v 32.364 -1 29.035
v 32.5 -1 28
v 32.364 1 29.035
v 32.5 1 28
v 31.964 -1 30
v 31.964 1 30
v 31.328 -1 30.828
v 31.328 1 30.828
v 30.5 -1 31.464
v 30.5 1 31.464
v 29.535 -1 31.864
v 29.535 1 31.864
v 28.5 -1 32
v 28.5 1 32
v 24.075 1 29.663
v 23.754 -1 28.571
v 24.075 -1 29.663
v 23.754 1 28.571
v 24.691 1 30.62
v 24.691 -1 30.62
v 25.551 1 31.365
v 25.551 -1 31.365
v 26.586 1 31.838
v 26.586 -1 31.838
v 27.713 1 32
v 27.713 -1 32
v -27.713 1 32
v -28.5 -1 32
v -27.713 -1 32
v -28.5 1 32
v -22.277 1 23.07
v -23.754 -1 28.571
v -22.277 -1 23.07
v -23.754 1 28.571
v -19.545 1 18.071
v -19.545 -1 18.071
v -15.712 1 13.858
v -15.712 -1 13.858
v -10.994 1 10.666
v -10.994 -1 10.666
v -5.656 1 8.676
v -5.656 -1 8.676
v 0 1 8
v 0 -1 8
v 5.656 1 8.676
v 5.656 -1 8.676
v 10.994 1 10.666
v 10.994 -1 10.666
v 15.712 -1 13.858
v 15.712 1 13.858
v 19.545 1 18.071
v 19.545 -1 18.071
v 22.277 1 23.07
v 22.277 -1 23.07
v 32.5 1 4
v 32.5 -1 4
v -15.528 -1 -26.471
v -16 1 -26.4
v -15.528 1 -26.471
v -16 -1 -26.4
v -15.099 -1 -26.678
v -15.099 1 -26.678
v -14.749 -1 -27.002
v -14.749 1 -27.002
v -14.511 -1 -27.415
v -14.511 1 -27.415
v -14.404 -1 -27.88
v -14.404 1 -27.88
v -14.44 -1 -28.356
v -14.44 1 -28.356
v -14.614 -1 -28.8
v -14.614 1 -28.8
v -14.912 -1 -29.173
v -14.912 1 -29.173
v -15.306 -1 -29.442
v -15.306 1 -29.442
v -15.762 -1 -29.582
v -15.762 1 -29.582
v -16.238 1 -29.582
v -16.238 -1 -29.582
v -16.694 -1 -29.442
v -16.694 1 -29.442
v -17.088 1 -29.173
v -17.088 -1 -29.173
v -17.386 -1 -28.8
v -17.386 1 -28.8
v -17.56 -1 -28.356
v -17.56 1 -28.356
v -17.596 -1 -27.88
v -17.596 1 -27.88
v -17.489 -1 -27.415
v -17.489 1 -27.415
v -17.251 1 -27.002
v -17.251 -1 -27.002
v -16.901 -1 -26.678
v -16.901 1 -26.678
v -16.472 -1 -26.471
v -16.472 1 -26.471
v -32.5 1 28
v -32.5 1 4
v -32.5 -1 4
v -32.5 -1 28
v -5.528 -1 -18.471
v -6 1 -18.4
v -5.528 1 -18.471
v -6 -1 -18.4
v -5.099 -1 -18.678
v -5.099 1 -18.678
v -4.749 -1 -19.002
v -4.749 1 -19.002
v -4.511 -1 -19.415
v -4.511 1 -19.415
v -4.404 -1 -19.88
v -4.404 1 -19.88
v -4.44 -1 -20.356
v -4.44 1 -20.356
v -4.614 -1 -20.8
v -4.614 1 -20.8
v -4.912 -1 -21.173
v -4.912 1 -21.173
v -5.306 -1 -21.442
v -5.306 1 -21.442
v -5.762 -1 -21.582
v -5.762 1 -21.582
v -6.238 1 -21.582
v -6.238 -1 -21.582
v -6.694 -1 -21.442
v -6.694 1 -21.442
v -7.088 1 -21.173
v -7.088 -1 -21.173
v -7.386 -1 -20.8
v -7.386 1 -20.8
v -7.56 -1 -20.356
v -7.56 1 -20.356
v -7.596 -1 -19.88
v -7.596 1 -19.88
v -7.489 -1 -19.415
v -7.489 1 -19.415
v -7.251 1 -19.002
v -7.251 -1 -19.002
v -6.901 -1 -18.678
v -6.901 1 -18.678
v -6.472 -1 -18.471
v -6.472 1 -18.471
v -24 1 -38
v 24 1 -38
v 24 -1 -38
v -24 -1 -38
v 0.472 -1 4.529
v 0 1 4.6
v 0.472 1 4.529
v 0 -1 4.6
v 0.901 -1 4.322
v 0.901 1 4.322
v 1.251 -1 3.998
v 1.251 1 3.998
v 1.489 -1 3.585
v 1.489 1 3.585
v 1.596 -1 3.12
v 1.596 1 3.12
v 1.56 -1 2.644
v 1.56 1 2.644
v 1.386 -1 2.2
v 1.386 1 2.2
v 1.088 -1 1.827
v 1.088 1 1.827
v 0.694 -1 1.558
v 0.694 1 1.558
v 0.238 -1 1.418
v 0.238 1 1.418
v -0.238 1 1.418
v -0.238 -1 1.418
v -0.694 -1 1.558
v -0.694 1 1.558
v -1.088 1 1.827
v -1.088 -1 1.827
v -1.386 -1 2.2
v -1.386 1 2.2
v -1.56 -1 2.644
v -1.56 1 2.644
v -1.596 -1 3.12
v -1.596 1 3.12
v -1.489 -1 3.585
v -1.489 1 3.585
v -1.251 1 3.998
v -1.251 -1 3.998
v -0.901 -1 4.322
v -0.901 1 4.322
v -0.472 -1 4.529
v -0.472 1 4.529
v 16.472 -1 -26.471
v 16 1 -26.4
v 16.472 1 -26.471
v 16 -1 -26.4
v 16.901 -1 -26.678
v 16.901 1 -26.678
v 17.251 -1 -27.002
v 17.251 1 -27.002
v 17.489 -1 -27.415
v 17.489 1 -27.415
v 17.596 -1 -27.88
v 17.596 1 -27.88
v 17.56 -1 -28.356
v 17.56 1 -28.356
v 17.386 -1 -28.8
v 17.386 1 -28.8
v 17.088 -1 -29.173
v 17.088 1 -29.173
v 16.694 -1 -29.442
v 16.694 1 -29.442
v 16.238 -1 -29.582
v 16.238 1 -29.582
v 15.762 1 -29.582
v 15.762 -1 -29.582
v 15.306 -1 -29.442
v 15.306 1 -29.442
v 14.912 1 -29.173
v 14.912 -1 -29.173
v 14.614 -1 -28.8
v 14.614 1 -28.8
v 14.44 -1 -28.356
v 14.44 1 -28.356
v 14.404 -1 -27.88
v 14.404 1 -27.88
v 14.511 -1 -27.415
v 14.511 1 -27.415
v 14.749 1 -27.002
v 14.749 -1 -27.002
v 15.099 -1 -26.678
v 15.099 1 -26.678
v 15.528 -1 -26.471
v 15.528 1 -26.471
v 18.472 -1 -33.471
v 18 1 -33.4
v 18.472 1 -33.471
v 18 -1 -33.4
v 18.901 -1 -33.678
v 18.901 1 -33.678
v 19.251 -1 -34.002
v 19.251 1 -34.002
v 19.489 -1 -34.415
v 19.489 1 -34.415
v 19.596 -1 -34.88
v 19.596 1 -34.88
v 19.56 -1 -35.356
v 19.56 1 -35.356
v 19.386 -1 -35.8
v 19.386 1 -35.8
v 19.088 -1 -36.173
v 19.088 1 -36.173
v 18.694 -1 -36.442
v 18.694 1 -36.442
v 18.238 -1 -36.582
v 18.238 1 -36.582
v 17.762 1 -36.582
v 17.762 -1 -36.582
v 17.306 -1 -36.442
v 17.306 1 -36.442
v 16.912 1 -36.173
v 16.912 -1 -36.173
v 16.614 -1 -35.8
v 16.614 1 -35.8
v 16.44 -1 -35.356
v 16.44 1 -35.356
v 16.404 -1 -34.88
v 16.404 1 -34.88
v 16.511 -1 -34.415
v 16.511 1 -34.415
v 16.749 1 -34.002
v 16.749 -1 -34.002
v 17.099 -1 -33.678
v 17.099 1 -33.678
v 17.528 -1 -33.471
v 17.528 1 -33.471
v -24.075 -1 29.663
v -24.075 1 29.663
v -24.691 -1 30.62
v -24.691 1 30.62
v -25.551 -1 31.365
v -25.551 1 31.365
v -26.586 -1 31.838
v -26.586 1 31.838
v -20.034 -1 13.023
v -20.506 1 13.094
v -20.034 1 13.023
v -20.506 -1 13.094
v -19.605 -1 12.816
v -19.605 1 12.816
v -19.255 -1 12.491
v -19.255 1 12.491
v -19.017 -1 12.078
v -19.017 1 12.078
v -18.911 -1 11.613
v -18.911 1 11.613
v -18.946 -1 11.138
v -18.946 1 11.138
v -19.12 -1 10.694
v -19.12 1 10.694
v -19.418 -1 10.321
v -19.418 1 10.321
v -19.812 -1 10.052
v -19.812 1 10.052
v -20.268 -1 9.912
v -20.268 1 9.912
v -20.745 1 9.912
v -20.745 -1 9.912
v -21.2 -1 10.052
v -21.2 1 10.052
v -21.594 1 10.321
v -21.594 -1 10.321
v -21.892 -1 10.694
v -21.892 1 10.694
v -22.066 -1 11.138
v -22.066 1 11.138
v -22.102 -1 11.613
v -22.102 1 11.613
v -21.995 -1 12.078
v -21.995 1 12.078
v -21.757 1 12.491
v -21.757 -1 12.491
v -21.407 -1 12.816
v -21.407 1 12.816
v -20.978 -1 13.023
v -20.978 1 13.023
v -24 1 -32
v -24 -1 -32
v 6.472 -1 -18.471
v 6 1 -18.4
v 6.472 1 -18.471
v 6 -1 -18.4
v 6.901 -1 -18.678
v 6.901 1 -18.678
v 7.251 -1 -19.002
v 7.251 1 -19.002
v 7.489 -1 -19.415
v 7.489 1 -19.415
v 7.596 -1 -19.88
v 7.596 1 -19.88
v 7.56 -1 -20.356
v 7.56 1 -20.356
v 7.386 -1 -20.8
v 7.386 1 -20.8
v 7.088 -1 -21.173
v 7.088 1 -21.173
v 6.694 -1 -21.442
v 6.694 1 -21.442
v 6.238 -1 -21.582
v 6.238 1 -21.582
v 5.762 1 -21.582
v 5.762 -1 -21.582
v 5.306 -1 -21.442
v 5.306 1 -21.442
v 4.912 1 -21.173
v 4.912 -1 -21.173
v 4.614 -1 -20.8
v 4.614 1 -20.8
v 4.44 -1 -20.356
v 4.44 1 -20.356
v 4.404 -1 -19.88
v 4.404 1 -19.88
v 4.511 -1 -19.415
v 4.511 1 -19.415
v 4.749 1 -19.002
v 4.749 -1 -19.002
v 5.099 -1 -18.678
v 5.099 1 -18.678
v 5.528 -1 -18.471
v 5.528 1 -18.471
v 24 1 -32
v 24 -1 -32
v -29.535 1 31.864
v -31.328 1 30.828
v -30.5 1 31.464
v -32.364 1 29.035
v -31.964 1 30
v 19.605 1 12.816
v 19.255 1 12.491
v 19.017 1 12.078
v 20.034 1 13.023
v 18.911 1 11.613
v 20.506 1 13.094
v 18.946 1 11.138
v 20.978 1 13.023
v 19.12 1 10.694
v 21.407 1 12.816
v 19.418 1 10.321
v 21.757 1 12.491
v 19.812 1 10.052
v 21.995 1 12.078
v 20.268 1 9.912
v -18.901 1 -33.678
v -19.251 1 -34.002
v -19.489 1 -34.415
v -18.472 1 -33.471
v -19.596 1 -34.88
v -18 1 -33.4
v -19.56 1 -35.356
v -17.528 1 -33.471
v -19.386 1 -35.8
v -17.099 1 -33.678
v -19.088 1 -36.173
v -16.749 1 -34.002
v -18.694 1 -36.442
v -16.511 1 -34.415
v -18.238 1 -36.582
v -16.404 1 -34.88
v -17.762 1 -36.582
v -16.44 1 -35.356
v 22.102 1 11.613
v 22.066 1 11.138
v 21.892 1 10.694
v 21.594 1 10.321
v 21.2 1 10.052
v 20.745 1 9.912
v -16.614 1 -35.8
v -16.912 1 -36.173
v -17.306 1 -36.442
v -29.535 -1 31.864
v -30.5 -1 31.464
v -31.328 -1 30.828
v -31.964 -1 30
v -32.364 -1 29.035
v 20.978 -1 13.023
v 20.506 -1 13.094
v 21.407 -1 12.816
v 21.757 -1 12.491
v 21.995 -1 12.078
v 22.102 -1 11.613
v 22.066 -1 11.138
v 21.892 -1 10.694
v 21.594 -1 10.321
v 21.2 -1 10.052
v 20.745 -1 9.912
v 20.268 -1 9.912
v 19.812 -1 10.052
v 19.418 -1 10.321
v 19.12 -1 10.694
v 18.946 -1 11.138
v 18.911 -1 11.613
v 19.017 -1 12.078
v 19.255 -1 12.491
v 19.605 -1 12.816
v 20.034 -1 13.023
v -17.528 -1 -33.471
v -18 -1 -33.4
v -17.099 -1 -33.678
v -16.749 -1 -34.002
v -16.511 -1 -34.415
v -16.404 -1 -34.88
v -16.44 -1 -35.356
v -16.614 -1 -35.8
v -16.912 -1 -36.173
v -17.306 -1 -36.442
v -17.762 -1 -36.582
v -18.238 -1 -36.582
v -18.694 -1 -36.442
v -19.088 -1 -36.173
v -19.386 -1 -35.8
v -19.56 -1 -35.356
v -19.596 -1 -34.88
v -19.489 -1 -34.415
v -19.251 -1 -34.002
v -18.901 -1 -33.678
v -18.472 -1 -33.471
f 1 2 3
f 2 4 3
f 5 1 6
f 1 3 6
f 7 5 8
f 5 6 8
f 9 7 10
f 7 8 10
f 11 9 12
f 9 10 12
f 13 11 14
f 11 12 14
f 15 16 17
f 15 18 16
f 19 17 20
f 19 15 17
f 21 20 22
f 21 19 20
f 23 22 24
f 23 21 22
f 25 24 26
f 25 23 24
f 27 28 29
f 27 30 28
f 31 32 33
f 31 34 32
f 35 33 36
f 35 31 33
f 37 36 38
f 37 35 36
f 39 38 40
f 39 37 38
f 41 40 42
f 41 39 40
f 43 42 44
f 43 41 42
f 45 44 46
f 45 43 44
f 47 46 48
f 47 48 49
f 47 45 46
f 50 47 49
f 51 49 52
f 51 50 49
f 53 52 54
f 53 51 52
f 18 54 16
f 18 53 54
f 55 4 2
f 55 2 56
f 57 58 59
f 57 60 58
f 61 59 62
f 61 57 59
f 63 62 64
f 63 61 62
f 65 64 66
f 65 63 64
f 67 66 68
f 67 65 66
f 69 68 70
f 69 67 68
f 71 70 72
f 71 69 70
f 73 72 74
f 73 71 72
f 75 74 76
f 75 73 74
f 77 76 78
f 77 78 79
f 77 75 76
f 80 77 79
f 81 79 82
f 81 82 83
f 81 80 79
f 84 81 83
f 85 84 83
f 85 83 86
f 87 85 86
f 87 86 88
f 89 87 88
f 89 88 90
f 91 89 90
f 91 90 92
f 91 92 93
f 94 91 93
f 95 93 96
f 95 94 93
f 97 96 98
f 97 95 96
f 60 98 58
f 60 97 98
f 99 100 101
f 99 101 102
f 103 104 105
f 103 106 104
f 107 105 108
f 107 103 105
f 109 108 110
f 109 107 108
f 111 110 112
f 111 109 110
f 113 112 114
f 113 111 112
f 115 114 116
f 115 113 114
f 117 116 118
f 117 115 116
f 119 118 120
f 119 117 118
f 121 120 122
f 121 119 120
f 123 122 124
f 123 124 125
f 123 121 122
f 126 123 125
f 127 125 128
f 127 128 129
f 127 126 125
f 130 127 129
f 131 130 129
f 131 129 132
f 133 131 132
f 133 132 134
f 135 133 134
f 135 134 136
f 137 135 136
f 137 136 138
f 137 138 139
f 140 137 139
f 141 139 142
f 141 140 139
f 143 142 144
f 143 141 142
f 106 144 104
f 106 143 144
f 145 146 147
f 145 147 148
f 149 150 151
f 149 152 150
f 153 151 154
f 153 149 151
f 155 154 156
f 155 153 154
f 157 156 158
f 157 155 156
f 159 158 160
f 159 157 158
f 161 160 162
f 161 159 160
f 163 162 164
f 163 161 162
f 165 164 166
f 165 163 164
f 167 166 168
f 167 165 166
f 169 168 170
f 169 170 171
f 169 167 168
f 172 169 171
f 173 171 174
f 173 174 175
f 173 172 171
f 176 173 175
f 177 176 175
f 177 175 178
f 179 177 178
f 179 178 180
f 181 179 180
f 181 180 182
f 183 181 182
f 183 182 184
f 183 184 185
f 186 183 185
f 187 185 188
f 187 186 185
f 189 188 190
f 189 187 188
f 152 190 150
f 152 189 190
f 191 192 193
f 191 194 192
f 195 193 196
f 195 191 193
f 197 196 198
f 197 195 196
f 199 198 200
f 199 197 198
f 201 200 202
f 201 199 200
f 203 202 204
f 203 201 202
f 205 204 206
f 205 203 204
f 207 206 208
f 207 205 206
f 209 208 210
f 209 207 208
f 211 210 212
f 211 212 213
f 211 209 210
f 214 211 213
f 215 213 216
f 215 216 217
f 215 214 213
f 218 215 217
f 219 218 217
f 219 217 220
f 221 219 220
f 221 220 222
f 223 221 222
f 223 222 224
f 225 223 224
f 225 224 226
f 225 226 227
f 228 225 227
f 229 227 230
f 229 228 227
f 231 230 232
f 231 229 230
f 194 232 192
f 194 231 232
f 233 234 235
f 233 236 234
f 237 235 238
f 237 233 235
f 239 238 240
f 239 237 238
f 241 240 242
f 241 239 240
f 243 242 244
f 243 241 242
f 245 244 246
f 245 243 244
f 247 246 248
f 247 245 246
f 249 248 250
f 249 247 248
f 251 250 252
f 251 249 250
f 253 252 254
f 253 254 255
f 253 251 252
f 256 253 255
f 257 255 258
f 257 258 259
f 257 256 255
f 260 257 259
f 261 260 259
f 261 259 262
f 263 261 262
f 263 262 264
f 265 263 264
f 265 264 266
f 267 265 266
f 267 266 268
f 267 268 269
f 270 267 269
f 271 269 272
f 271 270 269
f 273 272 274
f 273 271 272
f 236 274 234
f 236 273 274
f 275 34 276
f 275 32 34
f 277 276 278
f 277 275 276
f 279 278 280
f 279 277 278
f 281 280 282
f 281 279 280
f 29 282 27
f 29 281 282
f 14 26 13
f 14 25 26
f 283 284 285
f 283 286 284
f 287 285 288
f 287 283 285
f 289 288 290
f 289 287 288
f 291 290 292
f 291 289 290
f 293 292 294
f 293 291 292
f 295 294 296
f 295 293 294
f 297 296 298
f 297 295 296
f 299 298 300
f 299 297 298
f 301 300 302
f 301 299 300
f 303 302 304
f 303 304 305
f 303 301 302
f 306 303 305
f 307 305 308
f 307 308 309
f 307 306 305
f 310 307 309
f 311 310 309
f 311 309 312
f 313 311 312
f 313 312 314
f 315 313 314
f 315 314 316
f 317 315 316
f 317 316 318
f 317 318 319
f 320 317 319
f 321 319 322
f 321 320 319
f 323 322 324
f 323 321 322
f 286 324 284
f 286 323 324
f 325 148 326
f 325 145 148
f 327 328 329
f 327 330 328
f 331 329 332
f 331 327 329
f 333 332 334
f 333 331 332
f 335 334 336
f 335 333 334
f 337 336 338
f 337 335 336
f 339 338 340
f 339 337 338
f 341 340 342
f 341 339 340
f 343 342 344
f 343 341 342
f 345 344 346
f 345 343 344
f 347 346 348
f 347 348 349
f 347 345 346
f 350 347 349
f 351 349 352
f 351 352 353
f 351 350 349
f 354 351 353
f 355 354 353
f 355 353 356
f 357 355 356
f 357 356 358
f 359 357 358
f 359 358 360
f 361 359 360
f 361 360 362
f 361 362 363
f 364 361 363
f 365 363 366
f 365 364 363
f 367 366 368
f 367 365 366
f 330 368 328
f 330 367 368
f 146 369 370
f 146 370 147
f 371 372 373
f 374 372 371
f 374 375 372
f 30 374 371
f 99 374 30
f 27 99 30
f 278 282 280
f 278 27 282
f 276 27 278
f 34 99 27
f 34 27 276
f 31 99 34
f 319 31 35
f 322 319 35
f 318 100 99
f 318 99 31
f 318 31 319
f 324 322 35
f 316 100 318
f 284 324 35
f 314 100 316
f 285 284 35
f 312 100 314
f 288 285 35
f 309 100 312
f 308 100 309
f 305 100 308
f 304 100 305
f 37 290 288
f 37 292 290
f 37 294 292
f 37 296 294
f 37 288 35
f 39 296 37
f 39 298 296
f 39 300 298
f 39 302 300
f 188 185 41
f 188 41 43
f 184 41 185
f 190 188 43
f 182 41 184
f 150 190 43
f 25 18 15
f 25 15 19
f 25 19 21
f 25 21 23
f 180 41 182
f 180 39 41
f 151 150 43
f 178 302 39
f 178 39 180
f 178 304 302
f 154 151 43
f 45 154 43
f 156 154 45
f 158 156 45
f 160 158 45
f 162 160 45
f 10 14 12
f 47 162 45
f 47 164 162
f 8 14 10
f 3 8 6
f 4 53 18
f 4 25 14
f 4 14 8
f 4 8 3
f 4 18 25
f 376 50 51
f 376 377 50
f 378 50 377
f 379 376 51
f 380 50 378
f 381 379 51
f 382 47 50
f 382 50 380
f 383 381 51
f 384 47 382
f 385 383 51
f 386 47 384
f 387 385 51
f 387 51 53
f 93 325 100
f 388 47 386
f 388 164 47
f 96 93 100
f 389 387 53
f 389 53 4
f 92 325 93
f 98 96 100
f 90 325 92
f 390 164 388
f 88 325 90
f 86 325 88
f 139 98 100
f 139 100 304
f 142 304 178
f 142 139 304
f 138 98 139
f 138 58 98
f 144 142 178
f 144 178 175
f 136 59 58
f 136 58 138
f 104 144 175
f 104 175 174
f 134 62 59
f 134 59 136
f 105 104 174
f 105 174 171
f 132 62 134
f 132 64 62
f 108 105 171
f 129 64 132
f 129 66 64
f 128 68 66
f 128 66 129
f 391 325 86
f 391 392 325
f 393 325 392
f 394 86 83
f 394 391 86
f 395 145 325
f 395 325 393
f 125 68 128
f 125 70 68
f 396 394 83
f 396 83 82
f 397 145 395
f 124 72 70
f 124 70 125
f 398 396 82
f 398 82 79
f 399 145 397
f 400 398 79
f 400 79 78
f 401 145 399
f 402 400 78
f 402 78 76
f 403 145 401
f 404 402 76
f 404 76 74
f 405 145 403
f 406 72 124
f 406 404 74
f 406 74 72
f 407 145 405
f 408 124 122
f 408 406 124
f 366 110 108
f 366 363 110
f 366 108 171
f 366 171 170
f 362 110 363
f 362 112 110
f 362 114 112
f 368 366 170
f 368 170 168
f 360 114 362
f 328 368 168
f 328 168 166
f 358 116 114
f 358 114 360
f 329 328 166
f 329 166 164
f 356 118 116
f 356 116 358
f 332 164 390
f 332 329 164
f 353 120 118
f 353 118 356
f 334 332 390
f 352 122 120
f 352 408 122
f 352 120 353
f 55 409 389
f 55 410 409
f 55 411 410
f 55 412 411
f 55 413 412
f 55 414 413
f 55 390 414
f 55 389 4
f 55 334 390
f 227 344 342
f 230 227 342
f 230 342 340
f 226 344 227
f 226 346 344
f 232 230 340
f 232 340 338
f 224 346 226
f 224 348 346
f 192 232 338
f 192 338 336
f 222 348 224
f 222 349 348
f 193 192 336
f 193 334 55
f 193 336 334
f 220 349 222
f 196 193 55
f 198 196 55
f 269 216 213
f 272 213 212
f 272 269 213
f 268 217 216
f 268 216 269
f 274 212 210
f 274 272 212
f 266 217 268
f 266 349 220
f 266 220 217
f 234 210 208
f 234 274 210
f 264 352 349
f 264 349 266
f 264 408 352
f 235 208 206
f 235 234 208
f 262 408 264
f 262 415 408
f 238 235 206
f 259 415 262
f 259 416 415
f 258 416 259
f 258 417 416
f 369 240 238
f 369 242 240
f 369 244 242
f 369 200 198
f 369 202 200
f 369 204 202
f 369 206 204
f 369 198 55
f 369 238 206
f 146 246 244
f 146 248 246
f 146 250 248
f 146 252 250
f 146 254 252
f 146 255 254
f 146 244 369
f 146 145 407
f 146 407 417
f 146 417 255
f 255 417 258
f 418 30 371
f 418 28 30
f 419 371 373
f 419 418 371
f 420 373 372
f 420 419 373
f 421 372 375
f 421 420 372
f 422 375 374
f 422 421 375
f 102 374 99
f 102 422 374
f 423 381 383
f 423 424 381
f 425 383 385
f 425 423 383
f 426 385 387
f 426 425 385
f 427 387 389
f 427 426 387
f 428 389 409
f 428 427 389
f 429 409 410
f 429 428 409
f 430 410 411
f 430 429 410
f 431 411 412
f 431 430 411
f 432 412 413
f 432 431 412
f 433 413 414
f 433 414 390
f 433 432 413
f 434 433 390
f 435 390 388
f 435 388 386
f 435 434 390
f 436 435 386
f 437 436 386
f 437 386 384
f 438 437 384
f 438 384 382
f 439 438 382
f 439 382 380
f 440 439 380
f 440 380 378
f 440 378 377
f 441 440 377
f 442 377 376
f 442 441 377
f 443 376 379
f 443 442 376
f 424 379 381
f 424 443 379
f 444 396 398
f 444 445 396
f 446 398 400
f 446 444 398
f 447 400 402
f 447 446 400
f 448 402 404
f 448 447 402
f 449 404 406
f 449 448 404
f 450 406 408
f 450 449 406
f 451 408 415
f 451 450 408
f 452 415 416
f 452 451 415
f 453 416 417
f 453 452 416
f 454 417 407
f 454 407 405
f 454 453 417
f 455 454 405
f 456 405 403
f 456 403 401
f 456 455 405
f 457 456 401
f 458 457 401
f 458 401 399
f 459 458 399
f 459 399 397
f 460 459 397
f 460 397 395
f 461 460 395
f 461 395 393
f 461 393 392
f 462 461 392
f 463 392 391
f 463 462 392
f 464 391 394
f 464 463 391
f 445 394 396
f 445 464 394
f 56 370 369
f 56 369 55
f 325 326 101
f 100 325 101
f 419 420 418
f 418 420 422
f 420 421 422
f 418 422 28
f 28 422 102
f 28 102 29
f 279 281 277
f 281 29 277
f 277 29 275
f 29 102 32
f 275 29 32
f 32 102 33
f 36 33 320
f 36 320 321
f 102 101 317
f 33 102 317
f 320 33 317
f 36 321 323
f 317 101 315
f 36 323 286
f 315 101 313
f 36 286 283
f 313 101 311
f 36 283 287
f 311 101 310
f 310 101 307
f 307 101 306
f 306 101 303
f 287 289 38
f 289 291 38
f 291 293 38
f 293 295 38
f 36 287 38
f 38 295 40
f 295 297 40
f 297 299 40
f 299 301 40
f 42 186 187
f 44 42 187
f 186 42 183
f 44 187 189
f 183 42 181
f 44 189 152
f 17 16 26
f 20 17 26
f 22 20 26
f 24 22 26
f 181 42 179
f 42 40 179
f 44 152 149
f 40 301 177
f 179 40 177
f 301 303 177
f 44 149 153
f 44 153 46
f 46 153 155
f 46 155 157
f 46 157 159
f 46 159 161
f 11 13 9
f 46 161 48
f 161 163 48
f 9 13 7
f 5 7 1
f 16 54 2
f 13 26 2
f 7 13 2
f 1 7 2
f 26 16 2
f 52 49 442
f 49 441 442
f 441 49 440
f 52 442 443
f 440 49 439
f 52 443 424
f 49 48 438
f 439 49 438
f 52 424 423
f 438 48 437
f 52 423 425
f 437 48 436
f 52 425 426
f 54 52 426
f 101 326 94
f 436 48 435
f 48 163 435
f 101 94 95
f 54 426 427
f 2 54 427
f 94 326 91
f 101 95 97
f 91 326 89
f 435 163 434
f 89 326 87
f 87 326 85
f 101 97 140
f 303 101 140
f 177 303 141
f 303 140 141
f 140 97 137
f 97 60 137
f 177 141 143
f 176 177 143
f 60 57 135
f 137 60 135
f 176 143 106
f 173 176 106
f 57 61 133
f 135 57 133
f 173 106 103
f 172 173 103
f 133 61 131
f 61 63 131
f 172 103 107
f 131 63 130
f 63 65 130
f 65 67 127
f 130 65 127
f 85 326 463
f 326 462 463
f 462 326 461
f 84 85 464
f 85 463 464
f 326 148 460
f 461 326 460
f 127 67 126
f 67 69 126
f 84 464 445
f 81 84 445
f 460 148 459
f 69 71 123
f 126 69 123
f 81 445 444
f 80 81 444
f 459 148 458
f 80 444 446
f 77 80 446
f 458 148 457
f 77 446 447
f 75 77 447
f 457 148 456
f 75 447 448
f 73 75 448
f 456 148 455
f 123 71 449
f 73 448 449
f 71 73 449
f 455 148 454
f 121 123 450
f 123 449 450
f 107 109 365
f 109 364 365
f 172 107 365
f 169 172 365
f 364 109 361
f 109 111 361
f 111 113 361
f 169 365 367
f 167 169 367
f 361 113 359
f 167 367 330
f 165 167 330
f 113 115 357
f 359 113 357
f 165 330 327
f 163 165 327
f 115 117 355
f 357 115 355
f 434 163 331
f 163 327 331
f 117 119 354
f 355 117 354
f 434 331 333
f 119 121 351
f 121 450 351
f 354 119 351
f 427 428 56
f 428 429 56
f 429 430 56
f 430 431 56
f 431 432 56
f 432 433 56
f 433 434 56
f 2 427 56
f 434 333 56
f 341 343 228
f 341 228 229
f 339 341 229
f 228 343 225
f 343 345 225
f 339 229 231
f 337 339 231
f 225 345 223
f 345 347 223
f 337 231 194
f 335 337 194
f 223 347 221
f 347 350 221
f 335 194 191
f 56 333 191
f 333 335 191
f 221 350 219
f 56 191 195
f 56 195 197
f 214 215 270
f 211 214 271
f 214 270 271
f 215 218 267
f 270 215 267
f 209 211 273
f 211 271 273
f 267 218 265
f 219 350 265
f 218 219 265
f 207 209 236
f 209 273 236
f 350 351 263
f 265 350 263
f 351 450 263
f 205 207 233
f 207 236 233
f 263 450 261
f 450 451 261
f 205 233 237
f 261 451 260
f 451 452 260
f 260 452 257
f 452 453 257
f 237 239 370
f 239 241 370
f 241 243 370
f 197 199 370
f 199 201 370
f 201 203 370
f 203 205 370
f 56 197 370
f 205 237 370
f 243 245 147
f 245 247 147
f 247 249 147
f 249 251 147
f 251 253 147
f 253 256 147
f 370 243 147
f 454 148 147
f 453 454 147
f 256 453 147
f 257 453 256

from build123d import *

# Parameters (mm, degrees)
SKETCH_1_R               = 1.6
EXTRUDE_1_DEPTH          = 1
FILLET_2_R               = 4
CUT_EXTRUDE_1_DEPTH      = 51.042481953
CUT_EXTRUDE_1_DEPTH_BACK = 51.042481953


with BuildPart() as part:
    # 草图1 → 凸台-拉伸1 (new, symmetric)
    with BuildSketch(Plane(origin=(0, 0, 0), x_dir=(1, 0, 0), z_dir=(0, 1, 0))):
        with BuildLine():
            ThreePointArc((-24, -32), (0, -8), (24, -32))
            Line((24, -32), (32.5, -32))
            Line((32.5, -32), (32.5, 32))
            Line((32.5, 32), (24, 32))
            Line((24, 32), (24, 38))
            Line((24, 38), (-24, 38))
            Line((-24, 38), (-24, 32))
            Line((-24, 32), (-32.5, 32))
            Line((-32.5, 32), (-32.5, -32))
            Line((-32.5, -32), (-24, -32))
        make_face()
        with Locations(Location((-20.506096654, -11.493903346, 0), (0, 0, 270))):
            Circle(SKETCH_1_R, mode=Mode.SUBTRACT)
        with Locations(Location((20.506096654, -11.493903346, 0), (0, 0, 270))):
            Circle(SKETCH_1_R, mode=Mode.SUBTRACT)
        with Locations(Location((-6, 20, 0), (0, 0, 270))):
            Circle(SKETCH_1_R, mode=Mode.SUBTRACT)
        with Locations(Location((-16, 28, 0), (0, 0, 270))):
            Circle(SKETCH_1_R, mode=Mode.SUBTRACT)
        with Locations(Location((0, -3, 0), (0, 0, 270))):
            Circle(SKETCH_1_R, mode=Mode.SUBTRACT)
        with Locations(Location((6, 20, 0), (0, 0, 270))):
            Circle(SKETCH_1_R, mode=Mode.SUBTRACT)
        with Locations(Location((16, 28, 0), (0, 0, 270))):
            Circle(SKETCH_1_R, mode=Mode.SUBTRACT)
        with Locations(Location((18, 35, 0), (0, 0, 270))):
            Circle(SKETCH_1_R, mode=Mode.SUBTRACT)
        with Locations(Location((-18, 35, 0), (0, 0, 270))):
            Circle(SKETCH_1_R, mode=Mode.SUBTRACT)
    extrude(amount=EXTRUDE_1_DEPTH, both=True)

    # 圆角2
    fillet_2_edges = [part.edges().sort_by_distance(p)[0] for p in [
        (32.5, 0, 32),
        (24, 0, 32),
        (-24, 0, 32),
        (-32.5, 0, 32),
    ]]
    fillet(fillet_2_edges, radius=FILLET_2_R)

    # 草图2 → 切除-拉伸1 (cut, two sides: drawn at the far end of the back side and taken through both)
    with BuildSketch(Plane(origin=(0, 1, 0), x_dir=(1, 0, 0), z_dir=(0, 1, 0)).offset(-CUT_EXTRUDE_1_DEPTH_BACK)):
        Polygon((32.5, 32), (24, 32), (32.5, -4), align=None)
        Polygon((-32.5, -4), (-32.5, 32), (-24, 32), align=None)
    extrude(amount=CUT_EXTRUDE_1_DEPTH + CUT_EXTRUDE_1_DEPTH_BACK, mode=Mode.SUBTRACT)


solid = part.part
